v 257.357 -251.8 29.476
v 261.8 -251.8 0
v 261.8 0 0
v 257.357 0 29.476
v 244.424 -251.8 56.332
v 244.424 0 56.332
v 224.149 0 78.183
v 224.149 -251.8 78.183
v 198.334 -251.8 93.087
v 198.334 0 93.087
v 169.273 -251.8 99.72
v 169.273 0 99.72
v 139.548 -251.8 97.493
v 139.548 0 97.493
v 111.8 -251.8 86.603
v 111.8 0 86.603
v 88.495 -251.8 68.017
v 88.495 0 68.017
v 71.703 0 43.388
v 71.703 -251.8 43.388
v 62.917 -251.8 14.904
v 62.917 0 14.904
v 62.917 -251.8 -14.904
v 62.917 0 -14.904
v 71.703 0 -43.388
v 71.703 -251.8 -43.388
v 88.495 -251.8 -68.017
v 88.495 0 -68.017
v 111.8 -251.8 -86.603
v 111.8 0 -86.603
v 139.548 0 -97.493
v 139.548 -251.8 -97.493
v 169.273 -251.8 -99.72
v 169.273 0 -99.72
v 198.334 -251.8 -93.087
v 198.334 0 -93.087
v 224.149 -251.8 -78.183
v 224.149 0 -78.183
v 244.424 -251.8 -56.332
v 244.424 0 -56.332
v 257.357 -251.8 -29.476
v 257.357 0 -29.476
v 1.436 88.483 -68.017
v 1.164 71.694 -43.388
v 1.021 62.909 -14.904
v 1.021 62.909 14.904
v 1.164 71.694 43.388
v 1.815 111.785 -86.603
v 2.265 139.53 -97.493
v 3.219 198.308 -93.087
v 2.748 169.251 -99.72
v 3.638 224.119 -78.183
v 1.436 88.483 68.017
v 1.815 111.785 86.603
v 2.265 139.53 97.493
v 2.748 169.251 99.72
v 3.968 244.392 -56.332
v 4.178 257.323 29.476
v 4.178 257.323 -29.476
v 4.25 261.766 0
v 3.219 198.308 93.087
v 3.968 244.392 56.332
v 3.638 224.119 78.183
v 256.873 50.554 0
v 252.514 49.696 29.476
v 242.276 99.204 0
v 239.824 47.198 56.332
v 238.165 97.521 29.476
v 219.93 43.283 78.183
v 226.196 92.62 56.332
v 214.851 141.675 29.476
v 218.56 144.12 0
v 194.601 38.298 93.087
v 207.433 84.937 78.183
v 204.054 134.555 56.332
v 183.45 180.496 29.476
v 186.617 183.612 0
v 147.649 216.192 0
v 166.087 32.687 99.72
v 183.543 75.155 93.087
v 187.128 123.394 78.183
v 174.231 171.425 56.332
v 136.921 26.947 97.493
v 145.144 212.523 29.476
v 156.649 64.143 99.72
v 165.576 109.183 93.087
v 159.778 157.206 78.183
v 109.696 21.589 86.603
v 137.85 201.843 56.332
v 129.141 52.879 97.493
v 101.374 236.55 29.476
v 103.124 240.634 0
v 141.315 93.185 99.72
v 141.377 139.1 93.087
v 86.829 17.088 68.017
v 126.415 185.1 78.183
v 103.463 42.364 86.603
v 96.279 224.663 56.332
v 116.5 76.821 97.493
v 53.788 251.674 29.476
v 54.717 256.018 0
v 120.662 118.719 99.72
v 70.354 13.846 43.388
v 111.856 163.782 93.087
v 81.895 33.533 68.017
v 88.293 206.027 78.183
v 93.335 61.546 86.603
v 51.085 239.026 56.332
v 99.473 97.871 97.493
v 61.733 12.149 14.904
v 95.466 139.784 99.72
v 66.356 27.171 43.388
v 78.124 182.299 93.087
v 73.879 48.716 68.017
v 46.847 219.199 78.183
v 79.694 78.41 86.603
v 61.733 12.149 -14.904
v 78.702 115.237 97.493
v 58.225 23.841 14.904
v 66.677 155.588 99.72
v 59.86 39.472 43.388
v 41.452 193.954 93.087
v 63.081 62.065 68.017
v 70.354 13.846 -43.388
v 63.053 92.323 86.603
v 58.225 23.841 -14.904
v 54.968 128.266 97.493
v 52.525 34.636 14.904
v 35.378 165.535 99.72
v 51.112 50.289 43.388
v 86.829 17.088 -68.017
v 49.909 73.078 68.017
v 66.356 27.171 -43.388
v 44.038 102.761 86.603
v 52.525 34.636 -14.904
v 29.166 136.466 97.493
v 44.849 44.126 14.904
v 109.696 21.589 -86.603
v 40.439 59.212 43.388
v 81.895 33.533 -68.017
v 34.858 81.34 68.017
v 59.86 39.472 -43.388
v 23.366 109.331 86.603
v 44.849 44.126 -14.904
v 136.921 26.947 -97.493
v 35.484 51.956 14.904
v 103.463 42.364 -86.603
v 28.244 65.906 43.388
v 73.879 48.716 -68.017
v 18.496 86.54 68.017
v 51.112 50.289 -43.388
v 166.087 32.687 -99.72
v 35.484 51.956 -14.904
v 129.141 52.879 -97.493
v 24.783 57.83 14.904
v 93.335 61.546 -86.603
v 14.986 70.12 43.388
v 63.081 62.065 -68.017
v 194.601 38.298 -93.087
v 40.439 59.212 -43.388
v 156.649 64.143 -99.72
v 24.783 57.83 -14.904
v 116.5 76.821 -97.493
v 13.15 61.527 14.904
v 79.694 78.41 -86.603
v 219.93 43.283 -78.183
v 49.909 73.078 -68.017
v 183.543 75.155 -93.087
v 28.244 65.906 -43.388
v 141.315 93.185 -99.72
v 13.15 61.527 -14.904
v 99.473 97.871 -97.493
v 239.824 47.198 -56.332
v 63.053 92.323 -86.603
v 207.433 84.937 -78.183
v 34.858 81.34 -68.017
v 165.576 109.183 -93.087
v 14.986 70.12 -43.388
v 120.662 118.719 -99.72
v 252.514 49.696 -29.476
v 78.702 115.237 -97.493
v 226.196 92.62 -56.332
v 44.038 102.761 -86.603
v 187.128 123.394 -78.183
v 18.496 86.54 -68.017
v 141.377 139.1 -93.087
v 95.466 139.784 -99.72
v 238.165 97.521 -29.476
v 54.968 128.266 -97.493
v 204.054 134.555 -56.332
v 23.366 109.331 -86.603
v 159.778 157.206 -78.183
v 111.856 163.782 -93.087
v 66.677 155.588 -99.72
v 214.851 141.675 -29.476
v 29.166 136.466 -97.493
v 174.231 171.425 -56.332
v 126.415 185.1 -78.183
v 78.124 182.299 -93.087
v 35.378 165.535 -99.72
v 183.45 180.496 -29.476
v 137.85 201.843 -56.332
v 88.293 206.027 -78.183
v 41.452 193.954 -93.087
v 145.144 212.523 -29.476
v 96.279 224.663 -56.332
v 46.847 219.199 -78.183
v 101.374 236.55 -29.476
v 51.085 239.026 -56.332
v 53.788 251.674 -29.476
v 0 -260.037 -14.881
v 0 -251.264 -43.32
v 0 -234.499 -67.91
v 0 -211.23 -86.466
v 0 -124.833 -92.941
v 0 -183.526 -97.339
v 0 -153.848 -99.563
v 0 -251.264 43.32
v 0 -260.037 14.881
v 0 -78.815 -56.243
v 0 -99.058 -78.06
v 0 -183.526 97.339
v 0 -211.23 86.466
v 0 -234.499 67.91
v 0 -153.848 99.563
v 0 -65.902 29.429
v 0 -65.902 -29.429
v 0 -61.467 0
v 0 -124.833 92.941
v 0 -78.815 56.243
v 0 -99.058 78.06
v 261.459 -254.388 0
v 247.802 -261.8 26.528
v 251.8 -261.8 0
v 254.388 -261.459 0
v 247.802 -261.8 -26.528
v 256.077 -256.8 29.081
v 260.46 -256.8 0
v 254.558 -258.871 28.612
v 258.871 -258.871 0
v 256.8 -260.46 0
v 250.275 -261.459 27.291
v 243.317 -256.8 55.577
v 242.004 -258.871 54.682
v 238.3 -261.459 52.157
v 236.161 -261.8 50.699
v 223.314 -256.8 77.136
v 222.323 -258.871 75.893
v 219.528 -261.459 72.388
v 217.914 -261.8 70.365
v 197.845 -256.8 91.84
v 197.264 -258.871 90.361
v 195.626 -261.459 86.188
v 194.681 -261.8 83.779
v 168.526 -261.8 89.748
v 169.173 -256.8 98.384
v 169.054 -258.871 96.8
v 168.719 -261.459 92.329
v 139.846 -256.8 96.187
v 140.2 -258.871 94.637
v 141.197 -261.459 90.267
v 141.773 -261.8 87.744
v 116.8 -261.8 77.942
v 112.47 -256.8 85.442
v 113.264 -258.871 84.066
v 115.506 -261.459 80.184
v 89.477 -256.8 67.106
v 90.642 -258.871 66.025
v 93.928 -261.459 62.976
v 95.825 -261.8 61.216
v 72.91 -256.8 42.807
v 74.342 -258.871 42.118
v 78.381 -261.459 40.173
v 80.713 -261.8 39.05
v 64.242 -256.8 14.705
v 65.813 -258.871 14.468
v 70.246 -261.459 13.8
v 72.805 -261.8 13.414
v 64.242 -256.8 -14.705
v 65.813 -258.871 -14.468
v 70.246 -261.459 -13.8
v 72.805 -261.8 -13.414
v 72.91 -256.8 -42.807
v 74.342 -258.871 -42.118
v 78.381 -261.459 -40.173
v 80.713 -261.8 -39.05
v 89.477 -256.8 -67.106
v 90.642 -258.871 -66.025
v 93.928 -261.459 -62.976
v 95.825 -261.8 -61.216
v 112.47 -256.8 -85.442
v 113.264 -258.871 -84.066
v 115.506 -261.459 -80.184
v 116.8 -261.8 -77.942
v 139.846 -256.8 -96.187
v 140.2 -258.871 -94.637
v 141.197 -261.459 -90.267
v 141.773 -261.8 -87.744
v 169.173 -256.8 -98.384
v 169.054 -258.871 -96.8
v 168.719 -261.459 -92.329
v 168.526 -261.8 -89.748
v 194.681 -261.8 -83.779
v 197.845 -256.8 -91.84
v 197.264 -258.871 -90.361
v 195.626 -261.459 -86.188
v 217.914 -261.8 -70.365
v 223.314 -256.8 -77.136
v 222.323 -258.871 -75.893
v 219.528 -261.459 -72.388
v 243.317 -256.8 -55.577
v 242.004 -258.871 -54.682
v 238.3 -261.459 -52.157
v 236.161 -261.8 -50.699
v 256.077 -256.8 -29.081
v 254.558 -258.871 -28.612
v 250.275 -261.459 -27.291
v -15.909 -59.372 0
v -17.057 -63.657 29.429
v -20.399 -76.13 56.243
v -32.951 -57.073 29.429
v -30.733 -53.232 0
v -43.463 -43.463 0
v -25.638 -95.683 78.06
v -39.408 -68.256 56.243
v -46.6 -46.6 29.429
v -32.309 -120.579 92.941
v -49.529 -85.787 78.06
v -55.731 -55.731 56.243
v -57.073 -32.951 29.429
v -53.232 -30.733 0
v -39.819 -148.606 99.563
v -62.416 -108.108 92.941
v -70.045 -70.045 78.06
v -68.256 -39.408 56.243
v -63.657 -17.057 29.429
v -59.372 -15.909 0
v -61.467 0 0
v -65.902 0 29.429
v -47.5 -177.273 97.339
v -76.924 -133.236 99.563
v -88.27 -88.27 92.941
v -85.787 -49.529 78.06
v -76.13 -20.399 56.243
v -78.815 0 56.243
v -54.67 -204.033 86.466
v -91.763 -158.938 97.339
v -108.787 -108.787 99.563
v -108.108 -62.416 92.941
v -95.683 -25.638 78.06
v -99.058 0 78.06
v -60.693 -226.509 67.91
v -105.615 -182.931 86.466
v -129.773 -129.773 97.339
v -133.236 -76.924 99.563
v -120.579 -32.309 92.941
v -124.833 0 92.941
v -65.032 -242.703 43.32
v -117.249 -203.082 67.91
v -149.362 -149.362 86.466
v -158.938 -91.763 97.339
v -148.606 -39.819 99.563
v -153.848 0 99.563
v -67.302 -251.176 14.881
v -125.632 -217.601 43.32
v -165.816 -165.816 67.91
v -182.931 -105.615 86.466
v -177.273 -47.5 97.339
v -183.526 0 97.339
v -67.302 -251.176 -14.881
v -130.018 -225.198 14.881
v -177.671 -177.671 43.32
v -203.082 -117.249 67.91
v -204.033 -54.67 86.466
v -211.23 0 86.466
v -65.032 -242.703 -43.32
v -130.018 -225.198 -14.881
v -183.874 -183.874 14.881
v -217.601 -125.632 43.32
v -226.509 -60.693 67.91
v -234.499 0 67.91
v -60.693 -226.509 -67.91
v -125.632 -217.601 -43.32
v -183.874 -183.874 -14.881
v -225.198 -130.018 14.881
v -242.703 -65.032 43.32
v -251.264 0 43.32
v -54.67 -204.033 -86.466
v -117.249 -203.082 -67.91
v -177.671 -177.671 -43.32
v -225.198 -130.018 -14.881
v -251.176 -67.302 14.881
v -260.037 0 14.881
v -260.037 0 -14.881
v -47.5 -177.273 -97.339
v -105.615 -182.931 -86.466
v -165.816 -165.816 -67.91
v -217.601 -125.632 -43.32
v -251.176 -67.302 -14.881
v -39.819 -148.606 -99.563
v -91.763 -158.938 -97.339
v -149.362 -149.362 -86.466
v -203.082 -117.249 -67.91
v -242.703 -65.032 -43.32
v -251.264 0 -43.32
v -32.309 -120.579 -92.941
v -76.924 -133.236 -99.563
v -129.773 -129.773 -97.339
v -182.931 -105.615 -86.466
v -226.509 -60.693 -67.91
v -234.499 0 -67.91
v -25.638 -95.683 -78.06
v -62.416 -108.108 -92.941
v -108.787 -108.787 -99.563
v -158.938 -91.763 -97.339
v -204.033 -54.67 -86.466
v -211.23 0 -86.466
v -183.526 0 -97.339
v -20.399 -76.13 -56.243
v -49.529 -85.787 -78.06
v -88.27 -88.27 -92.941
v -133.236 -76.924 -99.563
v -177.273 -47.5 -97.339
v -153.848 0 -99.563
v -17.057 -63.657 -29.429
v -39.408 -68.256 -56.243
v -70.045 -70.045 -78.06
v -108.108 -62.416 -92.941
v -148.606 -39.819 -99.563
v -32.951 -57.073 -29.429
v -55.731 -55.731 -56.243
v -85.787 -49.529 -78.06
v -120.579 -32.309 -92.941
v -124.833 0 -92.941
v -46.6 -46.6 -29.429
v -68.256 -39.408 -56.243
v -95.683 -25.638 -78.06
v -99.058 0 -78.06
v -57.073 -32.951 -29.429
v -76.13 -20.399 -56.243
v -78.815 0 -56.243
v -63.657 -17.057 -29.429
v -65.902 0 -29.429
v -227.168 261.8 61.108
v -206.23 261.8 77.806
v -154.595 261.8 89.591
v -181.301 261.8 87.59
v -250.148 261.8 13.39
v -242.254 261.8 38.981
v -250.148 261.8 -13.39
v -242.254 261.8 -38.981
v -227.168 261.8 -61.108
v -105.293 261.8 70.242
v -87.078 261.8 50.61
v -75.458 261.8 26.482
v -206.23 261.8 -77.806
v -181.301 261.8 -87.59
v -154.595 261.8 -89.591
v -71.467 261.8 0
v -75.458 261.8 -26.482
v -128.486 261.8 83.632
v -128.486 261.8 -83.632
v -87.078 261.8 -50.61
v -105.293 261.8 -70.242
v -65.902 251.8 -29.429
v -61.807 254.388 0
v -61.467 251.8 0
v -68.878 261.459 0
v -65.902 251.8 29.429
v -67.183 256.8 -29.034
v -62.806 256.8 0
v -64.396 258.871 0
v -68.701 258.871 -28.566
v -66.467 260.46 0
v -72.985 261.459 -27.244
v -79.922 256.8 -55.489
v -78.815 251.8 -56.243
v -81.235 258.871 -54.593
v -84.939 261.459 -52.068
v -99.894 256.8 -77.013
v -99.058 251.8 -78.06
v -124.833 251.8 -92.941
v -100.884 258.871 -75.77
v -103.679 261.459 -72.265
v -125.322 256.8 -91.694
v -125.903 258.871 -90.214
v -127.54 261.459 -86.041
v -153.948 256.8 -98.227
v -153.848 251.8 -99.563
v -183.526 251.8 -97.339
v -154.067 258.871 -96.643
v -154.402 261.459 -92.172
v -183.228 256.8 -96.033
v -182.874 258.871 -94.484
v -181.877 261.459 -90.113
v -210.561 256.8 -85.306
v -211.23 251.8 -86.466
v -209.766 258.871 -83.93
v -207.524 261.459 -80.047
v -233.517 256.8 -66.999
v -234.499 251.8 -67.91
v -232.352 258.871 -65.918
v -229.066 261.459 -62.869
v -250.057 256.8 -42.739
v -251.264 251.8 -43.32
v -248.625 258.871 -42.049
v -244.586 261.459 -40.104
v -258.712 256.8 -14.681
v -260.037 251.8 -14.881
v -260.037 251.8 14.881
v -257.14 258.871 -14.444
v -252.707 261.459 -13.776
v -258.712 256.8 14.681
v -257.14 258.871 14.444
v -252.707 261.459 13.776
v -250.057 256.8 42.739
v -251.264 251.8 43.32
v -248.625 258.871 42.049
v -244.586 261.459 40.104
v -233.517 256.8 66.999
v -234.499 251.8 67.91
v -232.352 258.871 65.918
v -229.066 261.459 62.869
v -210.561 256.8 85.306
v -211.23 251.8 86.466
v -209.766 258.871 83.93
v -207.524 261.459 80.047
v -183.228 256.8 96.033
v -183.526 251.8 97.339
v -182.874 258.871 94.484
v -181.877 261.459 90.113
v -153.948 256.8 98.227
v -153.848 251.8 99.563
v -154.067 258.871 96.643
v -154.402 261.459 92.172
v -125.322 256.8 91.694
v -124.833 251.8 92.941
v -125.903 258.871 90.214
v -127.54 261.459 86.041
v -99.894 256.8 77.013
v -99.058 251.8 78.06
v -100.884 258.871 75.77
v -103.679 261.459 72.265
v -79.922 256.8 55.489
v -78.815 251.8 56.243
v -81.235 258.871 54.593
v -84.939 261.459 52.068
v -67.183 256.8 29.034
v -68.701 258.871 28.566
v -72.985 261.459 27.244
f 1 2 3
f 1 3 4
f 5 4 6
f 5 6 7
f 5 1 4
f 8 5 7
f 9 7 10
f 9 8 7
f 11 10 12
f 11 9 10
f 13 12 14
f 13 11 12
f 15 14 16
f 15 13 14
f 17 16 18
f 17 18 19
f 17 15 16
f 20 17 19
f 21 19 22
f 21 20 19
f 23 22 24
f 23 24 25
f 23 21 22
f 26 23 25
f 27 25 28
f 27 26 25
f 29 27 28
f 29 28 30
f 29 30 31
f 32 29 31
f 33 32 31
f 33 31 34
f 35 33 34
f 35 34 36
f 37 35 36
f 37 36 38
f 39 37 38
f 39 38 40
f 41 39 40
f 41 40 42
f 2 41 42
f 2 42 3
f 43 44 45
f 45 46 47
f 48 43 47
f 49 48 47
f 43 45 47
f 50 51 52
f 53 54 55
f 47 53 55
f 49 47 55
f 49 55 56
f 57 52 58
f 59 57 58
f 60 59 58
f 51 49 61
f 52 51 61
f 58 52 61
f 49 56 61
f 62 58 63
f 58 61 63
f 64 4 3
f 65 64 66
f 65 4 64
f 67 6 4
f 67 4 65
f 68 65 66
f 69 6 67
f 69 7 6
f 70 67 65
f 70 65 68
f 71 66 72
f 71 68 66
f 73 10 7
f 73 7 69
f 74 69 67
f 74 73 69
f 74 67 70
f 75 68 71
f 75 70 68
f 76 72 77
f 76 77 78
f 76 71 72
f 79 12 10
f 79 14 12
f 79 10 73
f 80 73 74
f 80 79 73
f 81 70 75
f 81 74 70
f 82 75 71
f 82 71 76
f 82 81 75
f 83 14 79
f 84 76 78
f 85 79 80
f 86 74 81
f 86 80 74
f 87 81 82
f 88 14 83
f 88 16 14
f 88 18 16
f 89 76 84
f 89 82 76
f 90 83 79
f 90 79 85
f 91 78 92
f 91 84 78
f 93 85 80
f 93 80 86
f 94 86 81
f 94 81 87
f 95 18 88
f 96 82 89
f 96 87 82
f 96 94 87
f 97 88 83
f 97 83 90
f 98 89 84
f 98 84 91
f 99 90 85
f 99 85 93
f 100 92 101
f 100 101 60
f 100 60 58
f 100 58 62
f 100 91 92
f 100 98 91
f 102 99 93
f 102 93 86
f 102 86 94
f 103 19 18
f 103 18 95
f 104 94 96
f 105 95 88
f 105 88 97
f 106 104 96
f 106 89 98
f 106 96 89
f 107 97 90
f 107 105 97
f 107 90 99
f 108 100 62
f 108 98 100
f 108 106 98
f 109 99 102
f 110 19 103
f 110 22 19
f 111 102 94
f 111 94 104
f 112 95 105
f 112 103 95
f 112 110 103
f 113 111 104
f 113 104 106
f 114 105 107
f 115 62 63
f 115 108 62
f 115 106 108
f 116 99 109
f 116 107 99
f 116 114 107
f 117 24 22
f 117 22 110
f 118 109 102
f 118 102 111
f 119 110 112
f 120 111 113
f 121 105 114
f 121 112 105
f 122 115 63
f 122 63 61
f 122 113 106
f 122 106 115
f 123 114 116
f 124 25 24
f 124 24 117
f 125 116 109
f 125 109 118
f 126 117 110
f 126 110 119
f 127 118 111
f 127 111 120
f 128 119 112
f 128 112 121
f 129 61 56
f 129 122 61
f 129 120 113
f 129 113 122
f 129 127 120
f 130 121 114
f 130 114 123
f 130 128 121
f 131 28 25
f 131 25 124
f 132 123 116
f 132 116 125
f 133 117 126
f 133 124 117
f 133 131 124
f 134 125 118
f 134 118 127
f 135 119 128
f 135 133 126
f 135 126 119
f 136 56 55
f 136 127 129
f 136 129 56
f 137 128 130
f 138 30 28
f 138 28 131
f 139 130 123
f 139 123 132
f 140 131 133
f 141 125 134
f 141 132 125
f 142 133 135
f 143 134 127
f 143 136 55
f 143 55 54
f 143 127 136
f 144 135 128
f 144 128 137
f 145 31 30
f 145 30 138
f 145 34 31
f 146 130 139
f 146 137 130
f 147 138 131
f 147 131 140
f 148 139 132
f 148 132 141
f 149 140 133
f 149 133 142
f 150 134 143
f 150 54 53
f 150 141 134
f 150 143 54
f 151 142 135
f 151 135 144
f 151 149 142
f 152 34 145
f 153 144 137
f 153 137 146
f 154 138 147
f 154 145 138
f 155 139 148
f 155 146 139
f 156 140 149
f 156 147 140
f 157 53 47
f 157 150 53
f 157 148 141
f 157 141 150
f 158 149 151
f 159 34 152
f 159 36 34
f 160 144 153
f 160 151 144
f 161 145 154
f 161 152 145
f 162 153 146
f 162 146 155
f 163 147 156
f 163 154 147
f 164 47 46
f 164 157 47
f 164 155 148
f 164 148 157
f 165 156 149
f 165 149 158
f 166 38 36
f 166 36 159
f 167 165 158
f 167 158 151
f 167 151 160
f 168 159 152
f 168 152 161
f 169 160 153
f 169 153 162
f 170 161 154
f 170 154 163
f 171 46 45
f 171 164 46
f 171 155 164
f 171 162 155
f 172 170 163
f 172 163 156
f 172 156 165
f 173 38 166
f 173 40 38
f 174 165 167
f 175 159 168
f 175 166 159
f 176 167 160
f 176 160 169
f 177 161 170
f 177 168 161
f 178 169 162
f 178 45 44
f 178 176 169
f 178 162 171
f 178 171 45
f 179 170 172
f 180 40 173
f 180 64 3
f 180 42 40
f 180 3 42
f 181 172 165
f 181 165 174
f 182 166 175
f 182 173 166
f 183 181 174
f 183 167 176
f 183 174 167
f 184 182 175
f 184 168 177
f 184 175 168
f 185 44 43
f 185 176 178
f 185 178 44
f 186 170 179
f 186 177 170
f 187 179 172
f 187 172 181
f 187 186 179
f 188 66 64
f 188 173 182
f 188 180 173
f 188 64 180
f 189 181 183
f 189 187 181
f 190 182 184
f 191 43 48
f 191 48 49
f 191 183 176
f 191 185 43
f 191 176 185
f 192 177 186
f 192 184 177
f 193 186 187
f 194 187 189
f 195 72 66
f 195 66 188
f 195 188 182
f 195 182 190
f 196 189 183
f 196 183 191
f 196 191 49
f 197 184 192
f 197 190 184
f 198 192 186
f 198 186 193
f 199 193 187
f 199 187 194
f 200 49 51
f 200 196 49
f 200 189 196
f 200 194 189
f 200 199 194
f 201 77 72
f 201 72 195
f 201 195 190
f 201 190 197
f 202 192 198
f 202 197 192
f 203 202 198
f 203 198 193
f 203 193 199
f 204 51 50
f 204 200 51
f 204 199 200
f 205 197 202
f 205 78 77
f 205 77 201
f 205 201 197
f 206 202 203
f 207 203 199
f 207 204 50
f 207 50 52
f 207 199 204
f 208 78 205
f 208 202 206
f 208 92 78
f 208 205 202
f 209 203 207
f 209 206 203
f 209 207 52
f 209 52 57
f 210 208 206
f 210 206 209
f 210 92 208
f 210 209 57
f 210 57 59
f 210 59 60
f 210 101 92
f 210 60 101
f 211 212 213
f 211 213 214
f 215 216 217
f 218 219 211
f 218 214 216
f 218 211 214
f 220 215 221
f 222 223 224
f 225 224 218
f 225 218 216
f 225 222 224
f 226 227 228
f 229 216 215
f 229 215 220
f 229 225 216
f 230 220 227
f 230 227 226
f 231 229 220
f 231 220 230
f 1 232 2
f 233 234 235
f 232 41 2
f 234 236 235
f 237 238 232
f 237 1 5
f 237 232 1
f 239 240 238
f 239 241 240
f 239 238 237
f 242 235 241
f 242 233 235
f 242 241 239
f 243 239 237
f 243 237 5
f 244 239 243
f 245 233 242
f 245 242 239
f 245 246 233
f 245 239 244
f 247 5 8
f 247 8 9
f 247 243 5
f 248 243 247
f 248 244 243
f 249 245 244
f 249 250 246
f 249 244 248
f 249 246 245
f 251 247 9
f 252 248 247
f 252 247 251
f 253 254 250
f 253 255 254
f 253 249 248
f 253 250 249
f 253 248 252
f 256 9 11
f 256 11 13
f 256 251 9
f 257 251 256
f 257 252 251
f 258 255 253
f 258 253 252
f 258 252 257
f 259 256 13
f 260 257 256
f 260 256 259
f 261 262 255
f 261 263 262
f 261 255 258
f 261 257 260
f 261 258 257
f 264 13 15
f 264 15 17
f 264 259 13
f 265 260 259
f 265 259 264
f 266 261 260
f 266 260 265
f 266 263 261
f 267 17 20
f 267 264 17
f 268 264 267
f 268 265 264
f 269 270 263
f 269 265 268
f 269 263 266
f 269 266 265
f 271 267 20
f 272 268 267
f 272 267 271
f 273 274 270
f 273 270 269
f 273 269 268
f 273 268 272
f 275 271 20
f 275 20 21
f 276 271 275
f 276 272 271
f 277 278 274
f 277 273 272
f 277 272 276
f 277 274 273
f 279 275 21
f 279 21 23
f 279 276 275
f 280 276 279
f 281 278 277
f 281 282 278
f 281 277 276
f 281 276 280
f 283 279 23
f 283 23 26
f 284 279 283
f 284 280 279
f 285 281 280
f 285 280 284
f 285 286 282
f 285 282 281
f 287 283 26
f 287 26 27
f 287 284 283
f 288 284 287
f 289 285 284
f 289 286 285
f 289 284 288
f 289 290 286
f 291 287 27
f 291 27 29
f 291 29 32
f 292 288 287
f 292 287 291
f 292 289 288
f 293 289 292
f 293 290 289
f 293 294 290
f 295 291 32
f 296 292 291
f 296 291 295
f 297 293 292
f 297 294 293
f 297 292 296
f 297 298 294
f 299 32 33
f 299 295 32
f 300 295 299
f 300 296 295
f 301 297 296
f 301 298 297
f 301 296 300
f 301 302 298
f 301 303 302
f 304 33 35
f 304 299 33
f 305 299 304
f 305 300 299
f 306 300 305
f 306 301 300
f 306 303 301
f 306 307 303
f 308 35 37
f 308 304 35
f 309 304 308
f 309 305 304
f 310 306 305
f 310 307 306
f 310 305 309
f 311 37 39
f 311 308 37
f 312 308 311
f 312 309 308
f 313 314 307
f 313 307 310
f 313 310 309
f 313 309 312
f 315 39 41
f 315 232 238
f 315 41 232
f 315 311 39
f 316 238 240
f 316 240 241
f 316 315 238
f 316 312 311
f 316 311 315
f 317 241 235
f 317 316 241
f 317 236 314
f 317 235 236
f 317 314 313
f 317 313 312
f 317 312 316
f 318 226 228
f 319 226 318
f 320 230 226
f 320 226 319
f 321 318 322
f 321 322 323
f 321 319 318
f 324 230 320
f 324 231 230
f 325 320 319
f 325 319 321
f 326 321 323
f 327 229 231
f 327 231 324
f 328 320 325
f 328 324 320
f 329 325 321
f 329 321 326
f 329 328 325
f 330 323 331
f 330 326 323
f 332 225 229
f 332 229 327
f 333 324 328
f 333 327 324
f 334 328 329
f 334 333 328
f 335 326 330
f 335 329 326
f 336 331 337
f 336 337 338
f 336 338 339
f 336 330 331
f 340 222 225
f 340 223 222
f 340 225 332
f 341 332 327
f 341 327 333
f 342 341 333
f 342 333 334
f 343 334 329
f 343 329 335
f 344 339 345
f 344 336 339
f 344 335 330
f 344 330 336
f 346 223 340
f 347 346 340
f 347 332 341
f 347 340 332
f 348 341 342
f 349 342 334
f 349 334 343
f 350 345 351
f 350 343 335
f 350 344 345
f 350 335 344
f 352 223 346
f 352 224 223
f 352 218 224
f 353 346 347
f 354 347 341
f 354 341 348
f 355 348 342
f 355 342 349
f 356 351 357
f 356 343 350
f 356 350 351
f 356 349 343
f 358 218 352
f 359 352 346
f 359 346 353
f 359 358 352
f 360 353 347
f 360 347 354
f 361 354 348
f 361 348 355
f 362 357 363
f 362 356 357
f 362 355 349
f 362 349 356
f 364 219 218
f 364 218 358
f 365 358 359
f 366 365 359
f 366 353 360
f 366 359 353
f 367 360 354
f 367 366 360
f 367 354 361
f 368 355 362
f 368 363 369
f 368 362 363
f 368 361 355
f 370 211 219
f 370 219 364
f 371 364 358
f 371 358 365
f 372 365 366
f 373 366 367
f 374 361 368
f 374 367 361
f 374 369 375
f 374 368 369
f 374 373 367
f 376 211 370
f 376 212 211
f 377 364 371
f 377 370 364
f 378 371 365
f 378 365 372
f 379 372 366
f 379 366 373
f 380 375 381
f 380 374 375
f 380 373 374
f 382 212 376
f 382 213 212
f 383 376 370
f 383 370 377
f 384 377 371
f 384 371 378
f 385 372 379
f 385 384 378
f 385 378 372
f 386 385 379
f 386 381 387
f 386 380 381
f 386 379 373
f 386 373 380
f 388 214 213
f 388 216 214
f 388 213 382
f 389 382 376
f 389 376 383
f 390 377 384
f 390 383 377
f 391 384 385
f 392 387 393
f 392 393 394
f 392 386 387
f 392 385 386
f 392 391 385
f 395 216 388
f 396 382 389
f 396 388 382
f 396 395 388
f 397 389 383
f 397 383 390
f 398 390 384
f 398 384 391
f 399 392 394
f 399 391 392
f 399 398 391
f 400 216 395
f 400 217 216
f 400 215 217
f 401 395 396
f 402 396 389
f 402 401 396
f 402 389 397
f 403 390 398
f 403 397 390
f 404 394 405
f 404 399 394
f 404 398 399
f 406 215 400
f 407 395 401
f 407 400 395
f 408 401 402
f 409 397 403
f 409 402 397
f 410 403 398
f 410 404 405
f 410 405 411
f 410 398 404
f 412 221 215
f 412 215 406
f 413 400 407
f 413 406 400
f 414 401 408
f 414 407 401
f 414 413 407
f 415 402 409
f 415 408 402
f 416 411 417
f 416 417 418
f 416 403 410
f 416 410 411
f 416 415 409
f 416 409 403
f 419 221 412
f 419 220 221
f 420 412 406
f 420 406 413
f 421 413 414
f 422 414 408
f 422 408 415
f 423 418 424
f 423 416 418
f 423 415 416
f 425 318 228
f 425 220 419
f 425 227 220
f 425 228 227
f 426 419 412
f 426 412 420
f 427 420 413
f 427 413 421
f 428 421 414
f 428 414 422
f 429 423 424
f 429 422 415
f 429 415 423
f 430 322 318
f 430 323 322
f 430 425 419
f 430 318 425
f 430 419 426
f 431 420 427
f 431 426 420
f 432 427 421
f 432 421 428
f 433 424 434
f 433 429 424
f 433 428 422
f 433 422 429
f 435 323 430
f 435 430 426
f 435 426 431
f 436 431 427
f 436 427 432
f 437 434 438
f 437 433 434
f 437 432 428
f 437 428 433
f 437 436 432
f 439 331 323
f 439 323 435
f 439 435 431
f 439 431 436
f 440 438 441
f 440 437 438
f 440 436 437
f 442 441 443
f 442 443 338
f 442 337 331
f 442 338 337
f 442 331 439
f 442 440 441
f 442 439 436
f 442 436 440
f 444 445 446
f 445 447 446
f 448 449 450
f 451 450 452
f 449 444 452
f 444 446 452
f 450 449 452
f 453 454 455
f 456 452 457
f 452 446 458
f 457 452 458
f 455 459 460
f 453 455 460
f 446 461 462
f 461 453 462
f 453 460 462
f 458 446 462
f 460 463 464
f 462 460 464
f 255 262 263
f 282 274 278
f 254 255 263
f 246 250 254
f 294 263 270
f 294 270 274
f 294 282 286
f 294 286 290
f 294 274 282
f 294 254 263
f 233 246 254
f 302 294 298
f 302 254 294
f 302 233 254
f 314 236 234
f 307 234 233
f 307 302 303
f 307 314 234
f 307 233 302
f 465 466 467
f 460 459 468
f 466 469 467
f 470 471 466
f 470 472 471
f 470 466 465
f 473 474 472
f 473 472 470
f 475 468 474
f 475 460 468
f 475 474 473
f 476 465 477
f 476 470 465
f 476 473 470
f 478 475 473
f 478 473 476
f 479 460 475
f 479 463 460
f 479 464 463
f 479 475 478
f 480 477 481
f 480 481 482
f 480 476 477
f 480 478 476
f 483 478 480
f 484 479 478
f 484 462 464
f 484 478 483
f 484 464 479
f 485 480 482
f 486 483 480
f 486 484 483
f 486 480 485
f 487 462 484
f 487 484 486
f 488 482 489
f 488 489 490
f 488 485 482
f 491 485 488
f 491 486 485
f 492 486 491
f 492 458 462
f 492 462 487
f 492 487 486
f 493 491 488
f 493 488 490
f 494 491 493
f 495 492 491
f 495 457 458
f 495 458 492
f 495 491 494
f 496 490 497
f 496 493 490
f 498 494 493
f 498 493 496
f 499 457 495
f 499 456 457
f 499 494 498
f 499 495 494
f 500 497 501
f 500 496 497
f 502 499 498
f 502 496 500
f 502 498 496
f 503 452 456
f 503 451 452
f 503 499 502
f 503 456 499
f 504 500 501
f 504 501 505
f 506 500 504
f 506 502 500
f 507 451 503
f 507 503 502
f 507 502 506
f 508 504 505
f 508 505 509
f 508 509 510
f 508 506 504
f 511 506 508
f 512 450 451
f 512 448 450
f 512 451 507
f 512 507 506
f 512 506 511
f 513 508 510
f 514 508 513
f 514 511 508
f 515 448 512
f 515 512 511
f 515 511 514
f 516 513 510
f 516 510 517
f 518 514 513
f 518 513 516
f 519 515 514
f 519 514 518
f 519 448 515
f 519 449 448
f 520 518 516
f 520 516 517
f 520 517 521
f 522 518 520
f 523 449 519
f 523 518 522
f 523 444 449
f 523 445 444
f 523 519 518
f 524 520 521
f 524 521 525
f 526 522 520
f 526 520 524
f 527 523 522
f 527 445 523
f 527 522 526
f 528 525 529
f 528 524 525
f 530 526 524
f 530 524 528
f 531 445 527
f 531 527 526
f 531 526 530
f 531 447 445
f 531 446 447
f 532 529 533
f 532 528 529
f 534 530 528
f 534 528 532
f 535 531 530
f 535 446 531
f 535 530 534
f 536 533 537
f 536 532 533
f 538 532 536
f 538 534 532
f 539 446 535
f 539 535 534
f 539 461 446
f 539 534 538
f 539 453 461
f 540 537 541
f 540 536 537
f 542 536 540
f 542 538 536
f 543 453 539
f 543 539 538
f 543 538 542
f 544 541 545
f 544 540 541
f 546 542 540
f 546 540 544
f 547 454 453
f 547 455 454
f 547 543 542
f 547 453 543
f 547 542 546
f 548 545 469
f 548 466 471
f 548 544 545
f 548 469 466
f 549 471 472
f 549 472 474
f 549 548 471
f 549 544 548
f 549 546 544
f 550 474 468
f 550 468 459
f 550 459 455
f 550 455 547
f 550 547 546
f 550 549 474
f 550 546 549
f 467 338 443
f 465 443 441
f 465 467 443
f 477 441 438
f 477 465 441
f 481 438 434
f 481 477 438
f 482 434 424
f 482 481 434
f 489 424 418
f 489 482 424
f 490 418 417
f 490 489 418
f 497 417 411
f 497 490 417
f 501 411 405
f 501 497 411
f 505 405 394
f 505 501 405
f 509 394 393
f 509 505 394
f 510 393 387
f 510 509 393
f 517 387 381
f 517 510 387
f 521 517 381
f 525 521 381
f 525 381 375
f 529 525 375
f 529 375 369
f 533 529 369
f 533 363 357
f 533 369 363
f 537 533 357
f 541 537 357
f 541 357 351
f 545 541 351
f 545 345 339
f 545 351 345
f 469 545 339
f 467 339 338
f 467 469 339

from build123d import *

# Parameters (mm, degrees)
F1_R      = 100
F2_FACE_R = 100
F4_R      = 158.537666862
F4_R_2    = 100
F5_DEPTH  = 261
F6_R      = 10
F7_R      = 99.8425511125
F9_R      = 10


with BuildPart() as f2:
    # F2: sweep along a path in F0
    with BuildLine(Plane.XY) as f2_path:
        ThreePointArc((161.8, 0), (115.3347128974, 113.4775043825), (2.6264029557, 161.7786821788))
    # F1 (on Front) → F2 (sweep)
    with BuildSketch(Plane.XZ):
        with Locations((161.8, 0)):
            Circle(F1_R)
    sweep(path=f2_path.line)

    # F3: sweep along a path in F0
    with BuildLine(Plane.XY) as f3_path:
        Line((161.8, 0), (161.8, -261.8))
    # F2_face (on face) → F3 (sweep)
    with BuildSketch(Plane(origin=(161.8, 0, 0), x_dir=(1, 0, 0), z_dir=(0, -1, 0))):
        Circle(F2_FACE_R)
    sweep(path=f3_path.line)

    # F4 (on face) → F5 (cut)
    with BuildSketch(Plane.XZ.offset(261.8)):
        with Locations((161.8, 0)):
            Circle(F4_R)
        with Locations((161.8, 0)):
            Circle(F4_R_2, mode=Mode.SUBTRACT)
    extrude(amount=-F5_DEPTH, mode=Mode.SUBTRACT)

    # F6
    f6_edges = [f2.edges().sort_by_distance(p)[0] for p in [
        (61.8, 0, 0),
        (61.8, -261.8, 0),
        (261.8, -130.9, 0),
    ]]
    fillet(f6_edges, radius=F6_R)


with BuildPart() as f8:
    # F8: sweep along a path in F0
    with BuildLine(Plane.XY) as f8_path:
        ThreePointArc((0, -161.1341685057), (-113.9390632312, -113.9390632312), (-161.1341685057, 0))
        Line((-161.1341685057, 0), (-161.1341685057, 261.8))
    # F7 (on Right) → F8 (sweep)
    with BuildSketch(Plane.YZ):
        with Locations((-161.3091230392, 0)):
            Circle(F7_R)
    sweep(path=f8_path.line)

    # F9
    f9_edges = [f8.edges().sort_by_distance(p)[0] for p in [
        (-261.151674, 261.8, 0),
    ]]
    fillet(f9_edges, radius=F9_R)


solid = Compound([f2.part, f8.part])
